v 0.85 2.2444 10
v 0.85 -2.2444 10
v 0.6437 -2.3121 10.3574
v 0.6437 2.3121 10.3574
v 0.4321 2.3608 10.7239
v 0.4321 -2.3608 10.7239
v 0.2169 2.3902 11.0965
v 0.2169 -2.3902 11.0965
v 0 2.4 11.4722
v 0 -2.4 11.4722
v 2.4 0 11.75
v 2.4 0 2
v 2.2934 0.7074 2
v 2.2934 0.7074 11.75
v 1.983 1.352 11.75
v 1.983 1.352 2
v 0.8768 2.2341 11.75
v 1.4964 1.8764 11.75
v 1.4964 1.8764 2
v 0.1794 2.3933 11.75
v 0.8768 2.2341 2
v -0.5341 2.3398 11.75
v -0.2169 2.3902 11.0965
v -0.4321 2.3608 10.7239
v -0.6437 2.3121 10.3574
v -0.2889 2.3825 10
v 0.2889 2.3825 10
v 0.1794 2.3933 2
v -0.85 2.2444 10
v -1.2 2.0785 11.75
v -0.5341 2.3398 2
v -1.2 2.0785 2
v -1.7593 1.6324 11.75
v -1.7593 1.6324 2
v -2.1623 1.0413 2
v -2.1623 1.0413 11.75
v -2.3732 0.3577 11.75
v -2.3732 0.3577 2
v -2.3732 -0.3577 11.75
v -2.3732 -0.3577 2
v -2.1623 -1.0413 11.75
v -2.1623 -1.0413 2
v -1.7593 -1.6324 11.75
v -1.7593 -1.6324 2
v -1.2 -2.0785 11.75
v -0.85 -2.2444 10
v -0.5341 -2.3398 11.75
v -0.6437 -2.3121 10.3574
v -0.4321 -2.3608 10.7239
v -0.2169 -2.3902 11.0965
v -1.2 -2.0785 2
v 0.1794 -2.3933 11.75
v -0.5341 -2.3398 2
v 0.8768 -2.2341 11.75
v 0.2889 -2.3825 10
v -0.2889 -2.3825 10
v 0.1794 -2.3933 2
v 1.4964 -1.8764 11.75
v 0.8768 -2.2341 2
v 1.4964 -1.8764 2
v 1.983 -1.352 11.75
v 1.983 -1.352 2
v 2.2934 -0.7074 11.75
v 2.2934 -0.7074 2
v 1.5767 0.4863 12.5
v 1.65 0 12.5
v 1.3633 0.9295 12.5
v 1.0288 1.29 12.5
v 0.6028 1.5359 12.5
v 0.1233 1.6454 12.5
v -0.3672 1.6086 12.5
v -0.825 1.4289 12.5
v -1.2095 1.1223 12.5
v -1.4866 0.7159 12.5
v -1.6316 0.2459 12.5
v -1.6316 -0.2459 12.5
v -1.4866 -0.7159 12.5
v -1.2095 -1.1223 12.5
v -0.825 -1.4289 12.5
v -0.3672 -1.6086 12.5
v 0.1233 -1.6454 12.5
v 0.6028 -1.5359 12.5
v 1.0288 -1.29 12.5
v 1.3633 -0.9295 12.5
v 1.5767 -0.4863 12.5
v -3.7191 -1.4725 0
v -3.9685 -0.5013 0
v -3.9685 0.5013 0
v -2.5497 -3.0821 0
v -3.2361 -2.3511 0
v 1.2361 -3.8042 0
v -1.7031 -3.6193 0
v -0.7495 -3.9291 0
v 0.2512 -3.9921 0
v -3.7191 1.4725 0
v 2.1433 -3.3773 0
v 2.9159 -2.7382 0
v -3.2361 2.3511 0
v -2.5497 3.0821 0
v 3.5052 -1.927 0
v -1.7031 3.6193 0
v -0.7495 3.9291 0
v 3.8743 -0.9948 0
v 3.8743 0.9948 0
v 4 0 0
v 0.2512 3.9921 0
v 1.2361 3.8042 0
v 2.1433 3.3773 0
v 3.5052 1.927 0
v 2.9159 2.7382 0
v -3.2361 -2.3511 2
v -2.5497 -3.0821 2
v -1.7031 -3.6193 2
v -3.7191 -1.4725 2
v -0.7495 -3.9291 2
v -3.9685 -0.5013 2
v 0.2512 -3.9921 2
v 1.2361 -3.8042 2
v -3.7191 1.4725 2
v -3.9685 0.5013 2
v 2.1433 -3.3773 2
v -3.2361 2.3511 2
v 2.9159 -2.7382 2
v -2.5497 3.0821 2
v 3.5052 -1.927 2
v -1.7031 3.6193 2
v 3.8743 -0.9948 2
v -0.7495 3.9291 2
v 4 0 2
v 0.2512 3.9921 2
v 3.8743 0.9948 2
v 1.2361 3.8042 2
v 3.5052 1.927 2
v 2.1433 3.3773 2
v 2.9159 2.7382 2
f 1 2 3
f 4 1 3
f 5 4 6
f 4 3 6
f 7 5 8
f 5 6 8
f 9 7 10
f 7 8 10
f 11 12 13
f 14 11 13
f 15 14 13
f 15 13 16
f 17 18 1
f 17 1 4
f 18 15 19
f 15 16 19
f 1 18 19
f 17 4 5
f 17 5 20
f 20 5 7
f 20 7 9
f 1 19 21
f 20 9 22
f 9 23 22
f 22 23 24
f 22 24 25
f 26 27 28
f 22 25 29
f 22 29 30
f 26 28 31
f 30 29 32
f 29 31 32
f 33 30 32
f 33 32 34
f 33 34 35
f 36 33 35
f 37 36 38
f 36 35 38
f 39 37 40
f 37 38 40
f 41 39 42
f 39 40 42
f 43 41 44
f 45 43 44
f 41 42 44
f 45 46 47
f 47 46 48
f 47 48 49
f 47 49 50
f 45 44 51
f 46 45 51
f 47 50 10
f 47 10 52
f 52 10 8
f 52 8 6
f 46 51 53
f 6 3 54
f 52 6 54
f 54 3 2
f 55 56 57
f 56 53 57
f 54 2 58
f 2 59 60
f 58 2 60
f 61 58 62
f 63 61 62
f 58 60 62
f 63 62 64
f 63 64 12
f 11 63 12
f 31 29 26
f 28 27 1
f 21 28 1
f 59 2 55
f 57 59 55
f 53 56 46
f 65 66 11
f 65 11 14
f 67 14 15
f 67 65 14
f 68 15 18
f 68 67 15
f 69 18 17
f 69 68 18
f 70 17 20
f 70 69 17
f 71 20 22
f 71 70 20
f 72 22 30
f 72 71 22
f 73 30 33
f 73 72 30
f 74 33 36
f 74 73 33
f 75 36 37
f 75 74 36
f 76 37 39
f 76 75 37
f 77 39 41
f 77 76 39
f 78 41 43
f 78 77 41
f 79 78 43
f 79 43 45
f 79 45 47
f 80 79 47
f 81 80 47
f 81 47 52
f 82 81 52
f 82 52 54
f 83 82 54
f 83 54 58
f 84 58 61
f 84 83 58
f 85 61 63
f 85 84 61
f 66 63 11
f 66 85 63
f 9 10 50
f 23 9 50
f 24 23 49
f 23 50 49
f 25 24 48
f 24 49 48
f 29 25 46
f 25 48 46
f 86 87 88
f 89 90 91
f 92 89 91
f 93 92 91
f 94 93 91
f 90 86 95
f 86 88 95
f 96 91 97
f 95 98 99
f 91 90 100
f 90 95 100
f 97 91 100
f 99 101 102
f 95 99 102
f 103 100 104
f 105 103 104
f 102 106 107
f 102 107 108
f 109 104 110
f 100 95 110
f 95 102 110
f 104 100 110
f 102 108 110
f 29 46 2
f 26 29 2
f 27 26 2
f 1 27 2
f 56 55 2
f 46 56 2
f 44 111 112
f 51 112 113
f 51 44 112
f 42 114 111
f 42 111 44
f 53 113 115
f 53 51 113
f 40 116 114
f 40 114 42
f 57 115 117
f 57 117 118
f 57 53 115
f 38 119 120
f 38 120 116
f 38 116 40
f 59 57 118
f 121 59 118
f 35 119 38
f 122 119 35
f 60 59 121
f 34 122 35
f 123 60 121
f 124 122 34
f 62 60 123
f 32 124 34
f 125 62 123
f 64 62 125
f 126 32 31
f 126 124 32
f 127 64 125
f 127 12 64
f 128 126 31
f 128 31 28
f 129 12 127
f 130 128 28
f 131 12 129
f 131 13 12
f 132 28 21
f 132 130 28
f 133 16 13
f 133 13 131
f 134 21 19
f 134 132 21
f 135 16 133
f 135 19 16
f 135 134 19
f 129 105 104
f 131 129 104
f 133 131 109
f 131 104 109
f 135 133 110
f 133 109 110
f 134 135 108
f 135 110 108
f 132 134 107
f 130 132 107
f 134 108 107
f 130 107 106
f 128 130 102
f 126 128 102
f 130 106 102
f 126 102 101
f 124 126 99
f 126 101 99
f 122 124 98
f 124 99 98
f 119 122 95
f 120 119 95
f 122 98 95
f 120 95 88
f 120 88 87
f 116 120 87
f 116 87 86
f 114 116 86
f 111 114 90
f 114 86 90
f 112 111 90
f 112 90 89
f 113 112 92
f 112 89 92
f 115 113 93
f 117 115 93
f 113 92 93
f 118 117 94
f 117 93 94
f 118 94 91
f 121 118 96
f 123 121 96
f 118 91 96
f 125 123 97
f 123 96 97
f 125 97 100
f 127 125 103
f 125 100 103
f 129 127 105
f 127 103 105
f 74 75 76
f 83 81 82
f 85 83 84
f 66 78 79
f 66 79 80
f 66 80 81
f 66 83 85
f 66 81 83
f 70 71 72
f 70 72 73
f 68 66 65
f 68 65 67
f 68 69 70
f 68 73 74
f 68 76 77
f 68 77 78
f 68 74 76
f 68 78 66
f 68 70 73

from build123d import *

# Parameters (mm, degrees)
F0_R     = 4
F1_DEPTH = 2
F2_R     = 2.4
F3_DEPTH = 10.5
F5_DEPTH = 5
F6_SIZE  = 0.75


with BuildPart() as f1:
    # F0 (on Top) → F1 (new body)
    with BuildSketch(Plane.XY):
        Circle(F0_R)
    extrude(amount=F1_DEPTH)

    # F2 (on face) → F3 (join)
    with BuildSketch(Plane.XY.offset(2)):
        Circle(F2_R)
    extrude(amount=F3_DEPTH)

    # F4 (on Front) → F5 (cut, symmetric)
    with BuildSketch(Plane.XZ):
        Polygon((0, 11.472243), (-0.85, 10), (0.85, 10), align=None)
    extrude(amount=F5_DEPTH, both=True, mode=Mode.SUBTRACT)

    # F6
    f6_edges = [f1.edges().sort_by_distance(p)[0] for p in [
        (-2.4, 0, 12.5),
    ]]
    chamfer(f6_edges, length=F6_SIZE)


solid = f1.part
